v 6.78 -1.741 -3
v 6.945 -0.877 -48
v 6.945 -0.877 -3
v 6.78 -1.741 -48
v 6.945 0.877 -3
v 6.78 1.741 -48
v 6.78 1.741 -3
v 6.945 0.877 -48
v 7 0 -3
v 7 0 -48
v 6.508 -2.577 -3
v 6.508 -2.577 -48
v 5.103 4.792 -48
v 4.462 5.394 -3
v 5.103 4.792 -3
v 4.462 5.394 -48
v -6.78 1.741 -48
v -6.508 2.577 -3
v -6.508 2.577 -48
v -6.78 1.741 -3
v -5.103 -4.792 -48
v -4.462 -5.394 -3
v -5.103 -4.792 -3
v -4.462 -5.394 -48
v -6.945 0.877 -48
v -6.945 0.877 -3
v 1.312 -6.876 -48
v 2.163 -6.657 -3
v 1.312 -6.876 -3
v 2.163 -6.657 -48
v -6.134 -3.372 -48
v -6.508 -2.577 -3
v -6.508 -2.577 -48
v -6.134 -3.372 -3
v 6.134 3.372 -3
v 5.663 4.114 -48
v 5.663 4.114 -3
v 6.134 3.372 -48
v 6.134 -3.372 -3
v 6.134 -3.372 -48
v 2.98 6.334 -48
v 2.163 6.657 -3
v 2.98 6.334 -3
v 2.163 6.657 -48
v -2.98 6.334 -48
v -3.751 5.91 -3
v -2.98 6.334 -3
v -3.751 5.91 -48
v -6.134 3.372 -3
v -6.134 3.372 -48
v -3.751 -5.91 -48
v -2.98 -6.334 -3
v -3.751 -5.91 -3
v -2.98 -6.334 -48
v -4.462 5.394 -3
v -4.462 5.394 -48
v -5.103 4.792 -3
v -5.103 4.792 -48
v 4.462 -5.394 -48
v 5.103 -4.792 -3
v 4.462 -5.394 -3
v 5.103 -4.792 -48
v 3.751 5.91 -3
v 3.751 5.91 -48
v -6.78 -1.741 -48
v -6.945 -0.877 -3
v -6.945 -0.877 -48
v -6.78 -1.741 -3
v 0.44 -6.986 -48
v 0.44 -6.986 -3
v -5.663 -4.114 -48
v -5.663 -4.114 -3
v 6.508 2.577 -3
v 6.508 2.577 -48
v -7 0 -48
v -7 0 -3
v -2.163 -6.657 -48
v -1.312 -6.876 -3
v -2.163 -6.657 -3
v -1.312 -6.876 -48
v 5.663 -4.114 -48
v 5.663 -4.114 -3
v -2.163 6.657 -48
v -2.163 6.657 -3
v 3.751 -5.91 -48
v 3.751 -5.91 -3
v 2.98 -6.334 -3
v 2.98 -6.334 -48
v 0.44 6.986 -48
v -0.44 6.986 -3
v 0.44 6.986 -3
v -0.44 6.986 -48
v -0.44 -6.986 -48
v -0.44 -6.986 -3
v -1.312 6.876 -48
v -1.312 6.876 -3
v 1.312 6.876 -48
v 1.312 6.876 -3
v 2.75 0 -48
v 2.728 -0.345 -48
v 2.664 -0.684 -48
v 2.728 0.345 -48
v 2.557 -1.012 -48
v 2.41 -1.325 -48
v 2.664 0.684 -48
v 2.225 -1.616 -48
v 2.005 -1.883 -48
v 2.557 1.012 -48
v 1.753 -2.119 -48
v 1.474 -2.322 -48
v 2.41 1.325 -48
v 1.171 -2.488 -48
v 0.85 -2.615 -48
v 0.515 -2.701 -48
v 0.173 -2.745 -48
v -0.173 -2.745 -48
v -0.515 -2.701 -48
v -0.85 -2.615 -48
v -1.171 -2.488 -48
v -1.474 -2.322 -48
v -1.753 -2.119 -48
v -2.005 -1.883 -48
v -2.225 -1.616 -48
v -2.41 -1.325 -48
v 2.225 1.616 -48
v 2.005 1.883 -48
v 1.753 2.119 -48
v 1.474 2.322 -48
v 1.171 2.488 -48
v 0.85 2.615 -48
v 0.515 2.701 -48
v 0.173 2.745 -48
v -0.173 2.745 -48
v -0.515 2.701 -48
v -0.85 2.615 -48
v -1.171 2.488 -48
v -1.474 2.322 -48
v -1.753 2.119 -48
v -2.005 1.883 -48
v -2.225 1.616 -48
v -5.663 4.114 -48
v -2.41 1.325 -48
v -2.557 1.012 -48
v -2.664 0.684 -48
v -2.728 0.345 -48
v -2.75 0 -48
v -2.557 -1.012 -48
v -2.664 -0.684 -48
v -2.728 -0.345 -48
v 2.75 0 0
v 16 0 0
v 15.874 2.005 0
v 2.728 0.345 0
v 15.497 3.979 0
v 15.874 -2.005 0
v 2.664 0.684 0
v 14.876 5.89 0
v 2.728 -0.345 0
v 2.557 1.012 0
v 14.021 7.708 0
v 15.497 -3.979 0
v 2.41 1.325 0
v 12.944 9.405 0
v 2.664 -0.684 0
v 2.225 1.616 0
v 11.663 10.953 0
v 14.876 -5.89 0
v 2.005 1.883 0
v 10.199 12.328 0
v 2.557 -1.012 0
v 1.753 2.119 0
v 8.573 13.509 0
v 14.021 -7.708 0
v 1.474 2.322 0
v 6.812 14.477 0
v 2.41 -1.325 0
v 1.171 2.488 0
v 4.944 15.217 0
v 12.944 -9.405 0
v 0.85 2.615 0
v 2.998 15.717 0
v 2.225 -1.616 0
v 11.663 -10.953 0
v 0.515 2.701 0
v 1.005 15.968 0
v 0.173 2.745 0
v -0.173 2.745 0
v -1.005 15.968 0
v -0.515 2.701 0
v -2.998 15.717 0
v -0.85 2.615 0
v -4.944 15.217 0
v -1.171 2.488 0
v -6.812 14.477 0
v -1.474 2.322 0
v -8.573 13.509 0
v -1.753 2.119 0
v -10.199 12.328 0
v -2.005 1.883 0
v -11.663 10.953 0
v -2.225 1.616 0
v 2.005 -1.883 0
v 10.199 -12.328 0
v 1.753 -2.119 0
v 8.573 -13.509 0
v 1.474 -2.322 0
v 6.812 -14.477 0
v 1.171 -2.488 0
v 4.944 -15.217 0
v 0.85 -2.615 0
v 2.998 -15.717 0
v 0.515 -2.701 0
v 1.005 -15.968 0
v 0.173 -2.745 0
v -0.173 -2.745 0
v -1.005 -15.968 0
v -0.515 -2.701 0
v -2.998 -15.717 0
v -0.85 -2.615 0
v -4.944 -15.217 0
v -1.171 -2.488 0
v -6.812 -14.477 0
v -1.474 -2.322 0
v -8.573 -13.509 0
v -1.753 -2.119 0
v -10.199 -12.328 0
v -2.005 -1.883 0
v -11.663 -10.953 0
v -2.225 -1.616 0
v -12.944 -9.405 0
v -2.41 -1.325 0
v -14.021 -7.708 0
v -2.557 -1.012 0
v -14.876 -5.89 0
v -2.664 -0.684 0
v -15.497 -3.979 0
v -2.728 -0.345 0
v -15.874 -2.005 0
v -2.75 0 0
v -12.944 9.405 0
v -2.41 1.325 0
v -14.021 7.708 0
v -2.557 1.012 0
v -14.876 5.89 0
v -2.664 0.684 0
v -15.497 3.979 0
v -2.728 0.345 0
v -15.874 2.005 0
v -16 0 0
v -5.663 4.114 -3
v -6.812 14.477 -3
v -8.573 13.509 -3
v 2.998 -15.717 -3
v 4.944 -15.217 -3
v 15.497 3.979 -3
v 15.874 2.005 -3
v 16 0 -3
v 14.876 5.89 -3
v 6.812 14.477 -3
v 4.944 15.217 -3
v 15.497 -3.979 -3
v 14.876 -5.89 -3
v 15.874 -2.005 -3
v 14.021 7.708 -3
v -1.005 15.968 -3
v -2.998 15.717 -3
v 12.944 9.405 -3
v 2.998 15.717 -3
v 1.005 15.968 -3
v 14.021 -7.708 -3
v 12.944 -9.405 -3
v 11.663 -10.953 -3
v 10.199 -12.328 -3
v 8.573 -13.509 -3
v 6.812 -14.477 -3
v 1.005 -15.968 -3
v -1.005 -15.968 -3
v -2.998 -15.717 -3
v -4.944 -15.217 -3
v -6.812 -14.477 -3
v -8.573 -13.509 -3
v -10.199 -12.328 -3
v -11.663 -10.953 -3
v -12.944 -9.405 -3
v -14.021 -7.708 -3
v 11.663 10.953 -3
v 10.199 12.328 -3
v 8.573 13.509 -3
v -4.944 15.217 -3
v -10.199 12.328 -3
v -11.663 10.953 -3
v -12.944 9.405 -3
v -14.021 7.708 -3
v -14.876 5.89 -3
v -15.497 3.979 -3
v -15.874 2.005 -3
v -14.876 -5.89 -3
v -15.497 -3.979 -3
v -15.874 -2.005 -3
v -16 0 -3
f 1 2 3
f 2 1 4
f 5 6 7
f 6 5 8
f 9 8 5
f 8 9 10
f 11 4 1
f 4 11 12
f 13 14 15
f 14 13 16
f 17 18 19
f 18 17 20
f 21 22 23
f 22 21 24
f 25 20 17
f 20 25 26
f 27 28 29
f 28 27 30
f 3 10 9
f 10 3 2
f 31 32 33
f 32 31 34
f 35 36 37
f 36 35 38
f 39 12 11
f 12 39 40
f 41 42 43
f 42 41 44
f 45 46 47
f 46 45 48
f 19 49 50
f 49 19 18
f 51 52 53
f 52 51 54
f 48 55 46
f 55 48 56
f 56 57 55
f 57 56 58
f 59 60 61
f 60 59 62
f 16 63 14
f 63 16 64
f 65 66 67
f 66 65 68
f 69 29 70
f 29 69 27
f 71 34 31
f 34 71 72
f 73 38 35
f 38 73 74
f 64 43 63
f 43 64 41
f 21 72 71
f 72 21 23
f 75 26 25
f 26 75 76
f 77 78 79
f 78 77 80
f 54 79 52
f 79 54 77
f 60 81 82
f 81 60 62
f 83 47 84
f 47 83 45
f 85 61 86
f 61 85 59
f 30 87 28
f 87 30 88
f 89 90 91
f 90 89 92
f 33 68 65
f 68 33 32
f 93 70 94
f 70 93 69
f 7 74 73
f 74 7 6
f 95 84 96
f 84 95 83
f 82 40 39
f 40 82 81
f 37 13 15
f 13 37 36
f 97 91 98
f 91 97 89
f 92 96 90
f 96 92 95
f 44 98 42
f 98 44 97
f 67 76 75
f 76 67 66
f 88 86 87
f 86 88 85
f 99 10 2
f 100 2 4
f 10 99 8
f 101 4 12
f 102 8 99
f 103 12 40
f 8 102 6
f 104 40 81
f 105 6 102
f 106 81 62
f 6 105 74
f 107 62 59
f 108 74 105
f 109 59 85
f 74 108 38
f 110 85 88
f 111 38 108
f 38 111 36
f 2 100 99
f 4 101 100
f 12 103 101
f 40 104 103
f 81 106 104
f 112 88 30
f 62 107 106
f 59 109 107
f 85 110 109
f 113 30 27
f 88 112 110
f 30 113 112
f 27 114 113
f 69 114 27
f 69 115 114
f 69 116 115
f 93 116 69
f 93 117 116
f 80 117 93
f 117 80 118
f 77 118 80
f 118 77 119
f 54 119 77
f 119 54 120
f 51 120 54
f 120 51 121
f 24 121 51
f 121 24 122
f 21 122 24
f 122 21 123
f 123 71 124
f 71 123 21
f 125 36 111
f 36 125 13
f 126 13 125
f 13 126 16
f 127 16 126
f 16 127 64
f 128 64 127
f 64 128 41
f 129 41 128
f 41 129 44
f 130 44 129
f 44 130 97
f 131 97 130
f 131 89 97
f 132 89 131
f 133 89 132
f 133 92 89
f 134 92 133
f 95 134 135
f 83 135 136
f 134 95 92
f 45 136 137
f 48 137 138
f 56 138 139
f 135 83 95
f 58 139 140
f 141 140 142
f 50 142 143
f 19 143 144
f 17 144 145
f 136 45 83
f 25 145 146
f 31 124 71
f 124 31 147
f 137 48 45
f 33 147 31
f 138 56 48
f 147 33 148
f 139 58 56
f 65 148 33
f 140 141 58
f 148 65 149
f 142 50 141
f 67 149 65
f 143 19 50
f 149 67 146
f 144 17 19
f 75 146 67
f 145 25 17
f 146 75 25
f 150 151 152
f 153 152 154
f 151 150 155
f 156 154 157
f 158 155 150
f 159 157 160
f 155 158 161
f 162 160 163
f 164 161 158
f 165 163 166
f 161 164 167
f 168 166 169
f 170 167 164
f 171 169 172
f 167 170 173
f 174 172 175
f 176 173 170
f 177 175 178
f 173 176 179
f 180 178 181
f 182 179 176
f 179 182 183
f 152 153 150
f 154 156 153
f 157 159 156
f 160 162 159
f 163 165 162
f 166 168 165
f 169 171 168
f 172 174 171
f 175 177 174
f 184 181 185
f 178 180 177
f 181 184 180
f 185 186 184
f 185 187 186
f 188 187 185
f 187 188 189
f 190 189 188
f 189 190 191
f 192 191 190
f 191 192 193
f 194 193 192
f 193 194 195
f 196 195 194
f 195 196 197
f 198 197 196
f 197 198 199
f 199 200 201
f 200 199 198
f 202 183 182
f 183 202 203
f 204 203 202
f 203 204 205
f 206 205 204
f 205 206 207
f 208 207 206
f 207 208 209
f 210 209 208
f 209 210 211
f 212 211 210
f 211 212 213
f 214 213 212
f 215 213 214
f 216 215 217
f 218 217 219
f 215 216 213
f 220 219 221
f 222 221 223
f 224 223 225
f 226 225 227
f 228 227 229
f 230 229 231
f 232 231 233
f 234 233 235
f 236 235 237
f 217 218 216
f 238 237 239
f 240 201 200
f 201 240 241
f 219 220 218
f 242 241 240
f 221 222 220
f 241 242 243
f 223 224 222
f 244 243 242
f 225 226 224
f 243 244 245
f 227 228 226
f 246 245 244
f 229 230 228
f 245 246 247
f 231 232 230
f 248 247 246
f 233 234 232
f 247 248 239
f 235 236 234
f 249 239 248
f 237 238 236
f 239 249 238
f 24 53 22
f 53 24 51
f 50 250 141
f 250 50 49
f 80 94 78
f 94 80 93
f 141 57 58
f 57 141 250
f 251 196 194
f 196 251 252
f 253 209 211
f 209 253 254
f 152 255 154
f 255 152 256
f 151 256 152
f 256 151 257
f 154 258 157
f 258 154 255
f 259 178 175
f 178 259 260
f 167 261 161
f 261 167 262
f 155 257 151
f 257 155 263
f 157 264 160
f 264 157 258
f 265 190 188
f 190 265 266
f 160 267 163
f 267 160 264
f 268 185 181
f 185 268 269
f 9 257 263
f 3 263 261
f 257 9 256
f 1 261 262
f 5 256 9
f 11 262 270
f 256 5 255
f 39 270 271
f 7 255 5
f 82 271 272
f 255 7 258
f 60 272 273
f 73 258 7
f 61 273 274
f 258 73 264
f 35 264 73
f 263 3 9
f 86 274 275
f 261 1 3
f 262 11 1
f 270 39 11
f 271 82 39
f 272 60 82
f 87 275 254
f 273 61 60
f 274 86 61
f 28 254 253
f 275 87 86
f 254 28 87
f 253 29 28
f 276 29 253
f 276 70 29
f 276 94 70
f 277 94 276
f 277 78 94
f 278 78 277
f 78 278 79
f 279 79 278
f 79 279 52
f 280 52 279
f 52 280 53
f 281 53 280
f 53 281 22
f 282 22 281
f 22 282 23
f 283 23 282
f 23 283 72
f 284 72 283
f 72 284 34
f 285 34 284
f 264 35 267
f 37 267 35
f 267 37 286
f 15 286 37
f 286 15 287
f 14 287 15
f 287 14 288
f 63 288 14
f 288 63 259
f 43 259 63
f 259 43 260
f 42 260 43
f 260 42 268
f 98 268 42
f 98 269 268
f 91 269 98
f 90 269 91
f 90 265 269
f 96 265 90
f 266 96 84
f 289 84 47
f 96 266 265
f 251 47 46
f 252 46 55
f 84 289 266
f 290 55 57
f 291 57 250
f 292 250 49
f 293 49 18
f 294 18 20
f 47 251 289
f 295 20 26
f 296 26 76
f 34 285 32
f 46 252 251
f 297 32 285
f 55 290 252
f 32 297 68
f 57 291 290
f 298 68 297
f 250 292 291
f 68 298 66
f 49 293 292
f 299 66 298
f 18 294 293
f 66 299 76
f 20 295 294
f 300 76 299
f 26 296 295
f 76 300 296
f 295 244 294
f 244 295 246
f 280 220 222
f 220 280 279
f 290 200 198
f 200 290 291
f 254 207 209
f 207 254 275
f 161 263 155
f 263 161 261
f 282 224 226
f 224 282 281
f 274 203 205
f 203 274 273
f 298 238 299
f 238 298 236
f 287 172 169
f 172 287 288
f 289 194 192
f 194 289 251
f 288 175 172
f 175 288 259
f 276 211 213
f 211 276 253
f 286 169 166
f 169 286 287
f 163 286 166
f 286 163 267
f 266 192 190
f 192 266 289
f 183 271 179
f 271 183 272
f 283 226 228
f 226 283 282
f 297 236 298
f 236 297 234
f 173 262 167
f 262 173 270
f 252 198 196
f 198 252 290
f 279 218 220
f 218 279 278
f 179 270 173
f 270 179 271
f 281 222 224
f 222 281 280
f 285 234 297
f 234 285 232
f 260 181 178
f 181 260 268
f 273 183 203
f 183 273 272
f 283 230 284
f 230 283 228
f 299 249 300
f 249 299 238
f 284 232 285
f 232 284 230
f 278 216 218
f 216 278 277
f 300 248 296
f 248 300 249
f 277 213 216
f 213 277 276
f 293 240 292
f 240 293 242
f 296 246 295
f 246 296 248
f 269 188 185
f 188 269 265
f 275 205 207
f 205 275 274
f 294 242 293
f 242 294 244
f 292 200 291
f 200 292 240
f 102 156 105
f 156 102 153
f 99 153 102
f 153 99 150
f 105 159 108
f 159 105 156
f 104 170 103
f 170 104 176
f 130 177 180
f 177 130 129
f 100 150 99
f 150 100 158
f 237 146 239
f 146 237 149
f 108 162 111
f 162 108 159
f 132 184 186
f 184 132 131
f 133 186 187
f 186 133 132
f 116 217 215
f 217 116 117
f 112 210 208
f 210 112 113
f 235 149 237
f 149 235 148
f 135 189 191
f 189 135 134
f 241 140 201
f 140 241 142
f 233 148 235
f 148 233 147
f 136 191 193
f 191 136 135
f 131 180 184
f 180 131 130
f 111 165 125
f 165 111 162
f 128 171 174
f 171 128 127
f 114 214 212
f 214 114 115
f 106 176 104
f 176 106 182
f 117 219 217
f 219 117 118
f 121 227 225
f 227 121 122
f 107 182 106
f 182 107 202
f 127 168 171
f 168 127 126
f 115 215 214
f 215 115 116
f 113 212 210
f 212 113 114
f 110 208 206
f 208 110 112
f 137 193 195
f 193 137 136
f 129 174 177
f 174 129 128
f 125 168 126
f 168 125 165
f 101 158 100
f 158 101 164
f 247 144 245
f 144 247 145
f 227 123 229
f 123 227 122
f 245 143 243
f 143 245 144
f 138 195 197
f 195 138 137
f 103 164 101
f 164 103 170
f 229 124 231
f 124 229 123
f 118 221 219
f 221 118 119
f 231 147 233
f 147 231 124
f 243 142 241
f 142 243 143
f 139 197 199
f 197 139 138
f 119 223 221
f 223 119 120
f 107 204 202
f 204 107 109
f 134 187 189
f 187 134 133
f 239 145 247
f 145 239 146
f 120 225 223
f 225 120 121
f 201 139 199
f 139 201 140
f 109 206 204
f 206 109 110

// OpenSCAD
$fn = 50;


difference() {
	union() {
		translate(v = [0, 0, -48.0000000000]) {
			cylinder(h = 48, r = 7.0000000000);
		}
		translate(v = [0, 0, -3.0000000000]) {
			cylinder(h = 3, r = 16.0000000000);
		}
	}
	union() {
		#translate(v = [0, 0, -48]) {
			cylinder(h = 48, r = 2.7500000000);
		}
	}
}
